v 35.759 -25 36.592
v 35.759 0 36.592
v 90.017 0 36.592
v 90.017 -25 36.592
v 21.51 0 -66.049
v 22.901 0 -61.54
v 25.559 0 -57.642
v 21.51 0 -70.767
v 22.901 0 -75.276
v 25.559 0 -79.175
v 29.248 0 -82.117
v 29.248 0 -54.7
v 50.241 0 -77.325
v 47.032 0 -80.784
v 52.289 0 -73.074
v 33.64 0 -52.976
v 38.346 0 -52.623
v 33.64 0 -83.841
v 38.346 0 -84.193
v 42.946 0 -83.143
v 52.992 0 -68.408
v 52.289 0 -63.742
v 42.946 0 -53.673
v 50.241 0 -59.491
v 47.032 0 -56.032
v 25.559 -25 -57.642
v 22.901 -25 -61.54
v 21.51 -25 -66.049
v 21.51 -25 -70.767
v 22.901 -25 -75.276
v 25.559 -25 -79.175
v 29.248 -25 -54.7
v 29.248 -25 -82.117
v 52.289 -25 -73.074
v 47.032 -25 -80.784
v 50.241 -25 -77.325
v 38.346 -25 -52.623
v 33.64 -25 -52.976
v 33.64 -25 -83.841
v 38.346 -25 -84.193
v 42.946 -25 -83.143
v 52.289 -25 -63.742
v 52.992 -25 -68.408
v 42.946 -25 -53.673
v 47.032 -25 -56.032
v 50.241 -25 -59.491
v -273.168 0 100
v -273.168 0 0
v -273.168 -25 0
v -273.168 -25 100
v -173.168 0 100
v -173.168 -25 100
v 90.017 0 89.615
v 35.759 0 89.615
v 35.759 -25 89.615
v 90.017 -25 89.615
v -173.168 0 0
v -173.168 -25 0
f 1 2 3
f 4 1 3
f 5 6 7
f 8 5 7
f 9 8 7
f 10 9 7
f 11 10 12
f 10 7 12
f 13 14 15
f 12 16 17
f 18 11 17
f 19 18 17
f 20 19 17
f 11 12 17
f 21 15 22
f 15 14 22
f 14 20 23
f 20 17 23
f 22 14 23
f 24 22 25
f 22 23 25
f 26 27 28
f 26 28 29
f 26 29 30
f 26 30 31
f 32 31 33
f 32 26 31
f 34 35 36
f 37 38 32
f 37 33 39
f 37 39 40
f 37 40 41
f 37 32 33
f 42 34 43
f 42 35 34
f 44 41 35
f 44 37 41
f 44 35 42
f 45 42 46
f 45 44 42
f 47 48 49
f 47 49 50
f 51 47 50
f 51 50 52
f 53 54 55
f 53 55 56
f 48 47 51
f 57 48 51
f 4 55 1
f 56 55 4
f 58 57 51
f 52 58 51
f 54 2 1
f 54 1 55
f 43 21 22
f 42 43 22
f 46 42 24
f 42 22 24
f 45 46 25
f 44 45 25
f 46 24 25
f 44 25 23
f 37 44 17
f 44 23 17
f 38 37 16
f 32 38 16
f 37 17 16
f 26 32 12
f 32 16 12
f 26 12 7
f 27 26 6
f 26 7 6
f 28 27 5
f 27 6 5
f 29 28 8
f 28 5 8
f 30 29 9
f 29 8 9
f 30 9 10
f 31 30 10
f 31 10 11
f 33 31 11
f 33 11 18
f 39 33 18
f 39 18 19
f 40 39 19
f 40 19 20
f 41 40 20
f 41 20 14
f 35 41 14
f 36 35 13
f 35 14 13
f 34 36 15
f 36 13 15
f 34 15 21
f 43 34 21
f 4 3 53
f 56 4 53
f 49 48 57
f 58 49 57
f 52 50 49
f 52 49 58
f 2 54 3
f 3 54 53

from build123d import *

# Parameters (mm, degrees)
F0_W     = 70.721321
F0_H     = 67.84005
F1_DEPTH = 25
F2_W     = 100
F2_H     = 100
F3_DEPTH = 25
F4_W     = 54.25863
F4_H     = 53.02266
F5_DEPTH = 25
F6_R     = 15.829205
F7_DEPTH = 25


with BuildPart() as f1:
    # F0 (on Front) → F1 (new body)
    with BuildSketch(Plane.XZ):
        with Locations((-127.561395, 28.1989)):
            Rectangle(F0_W, F0_H)
    extrude(amount=F1_DEPTH)


with BuildPart() as f3:
    # F2 (on Front) → F3 (new body)
    with BuildSketch(Plane.XZ):
        with Locations((-223.168355, 50)):
            Rectangle(F2_W, F2_H)
    extrude(amount=F3_DEPTH)


with BuildPart() as f5:
    # F4 (on Front) → F5 (new body)
    with BuildSketch(Plane.XZ):
        with Locations((62.88784, 63.103292)):
            Rectangle(F4_W, F4_H)
    extrude(amount=F5_DEPTH)


with BuildPart() as f7:
    # F6 (on Front) → F7 (new body)
    with BuildSketch(Plane.XZ):
        with Locations((37.162781, -68.408214)):
            Circle(F6_R)
    extrude(amount=F7_DEPTH)


solid = Compound([f3.part, f5.part, f7.part])
